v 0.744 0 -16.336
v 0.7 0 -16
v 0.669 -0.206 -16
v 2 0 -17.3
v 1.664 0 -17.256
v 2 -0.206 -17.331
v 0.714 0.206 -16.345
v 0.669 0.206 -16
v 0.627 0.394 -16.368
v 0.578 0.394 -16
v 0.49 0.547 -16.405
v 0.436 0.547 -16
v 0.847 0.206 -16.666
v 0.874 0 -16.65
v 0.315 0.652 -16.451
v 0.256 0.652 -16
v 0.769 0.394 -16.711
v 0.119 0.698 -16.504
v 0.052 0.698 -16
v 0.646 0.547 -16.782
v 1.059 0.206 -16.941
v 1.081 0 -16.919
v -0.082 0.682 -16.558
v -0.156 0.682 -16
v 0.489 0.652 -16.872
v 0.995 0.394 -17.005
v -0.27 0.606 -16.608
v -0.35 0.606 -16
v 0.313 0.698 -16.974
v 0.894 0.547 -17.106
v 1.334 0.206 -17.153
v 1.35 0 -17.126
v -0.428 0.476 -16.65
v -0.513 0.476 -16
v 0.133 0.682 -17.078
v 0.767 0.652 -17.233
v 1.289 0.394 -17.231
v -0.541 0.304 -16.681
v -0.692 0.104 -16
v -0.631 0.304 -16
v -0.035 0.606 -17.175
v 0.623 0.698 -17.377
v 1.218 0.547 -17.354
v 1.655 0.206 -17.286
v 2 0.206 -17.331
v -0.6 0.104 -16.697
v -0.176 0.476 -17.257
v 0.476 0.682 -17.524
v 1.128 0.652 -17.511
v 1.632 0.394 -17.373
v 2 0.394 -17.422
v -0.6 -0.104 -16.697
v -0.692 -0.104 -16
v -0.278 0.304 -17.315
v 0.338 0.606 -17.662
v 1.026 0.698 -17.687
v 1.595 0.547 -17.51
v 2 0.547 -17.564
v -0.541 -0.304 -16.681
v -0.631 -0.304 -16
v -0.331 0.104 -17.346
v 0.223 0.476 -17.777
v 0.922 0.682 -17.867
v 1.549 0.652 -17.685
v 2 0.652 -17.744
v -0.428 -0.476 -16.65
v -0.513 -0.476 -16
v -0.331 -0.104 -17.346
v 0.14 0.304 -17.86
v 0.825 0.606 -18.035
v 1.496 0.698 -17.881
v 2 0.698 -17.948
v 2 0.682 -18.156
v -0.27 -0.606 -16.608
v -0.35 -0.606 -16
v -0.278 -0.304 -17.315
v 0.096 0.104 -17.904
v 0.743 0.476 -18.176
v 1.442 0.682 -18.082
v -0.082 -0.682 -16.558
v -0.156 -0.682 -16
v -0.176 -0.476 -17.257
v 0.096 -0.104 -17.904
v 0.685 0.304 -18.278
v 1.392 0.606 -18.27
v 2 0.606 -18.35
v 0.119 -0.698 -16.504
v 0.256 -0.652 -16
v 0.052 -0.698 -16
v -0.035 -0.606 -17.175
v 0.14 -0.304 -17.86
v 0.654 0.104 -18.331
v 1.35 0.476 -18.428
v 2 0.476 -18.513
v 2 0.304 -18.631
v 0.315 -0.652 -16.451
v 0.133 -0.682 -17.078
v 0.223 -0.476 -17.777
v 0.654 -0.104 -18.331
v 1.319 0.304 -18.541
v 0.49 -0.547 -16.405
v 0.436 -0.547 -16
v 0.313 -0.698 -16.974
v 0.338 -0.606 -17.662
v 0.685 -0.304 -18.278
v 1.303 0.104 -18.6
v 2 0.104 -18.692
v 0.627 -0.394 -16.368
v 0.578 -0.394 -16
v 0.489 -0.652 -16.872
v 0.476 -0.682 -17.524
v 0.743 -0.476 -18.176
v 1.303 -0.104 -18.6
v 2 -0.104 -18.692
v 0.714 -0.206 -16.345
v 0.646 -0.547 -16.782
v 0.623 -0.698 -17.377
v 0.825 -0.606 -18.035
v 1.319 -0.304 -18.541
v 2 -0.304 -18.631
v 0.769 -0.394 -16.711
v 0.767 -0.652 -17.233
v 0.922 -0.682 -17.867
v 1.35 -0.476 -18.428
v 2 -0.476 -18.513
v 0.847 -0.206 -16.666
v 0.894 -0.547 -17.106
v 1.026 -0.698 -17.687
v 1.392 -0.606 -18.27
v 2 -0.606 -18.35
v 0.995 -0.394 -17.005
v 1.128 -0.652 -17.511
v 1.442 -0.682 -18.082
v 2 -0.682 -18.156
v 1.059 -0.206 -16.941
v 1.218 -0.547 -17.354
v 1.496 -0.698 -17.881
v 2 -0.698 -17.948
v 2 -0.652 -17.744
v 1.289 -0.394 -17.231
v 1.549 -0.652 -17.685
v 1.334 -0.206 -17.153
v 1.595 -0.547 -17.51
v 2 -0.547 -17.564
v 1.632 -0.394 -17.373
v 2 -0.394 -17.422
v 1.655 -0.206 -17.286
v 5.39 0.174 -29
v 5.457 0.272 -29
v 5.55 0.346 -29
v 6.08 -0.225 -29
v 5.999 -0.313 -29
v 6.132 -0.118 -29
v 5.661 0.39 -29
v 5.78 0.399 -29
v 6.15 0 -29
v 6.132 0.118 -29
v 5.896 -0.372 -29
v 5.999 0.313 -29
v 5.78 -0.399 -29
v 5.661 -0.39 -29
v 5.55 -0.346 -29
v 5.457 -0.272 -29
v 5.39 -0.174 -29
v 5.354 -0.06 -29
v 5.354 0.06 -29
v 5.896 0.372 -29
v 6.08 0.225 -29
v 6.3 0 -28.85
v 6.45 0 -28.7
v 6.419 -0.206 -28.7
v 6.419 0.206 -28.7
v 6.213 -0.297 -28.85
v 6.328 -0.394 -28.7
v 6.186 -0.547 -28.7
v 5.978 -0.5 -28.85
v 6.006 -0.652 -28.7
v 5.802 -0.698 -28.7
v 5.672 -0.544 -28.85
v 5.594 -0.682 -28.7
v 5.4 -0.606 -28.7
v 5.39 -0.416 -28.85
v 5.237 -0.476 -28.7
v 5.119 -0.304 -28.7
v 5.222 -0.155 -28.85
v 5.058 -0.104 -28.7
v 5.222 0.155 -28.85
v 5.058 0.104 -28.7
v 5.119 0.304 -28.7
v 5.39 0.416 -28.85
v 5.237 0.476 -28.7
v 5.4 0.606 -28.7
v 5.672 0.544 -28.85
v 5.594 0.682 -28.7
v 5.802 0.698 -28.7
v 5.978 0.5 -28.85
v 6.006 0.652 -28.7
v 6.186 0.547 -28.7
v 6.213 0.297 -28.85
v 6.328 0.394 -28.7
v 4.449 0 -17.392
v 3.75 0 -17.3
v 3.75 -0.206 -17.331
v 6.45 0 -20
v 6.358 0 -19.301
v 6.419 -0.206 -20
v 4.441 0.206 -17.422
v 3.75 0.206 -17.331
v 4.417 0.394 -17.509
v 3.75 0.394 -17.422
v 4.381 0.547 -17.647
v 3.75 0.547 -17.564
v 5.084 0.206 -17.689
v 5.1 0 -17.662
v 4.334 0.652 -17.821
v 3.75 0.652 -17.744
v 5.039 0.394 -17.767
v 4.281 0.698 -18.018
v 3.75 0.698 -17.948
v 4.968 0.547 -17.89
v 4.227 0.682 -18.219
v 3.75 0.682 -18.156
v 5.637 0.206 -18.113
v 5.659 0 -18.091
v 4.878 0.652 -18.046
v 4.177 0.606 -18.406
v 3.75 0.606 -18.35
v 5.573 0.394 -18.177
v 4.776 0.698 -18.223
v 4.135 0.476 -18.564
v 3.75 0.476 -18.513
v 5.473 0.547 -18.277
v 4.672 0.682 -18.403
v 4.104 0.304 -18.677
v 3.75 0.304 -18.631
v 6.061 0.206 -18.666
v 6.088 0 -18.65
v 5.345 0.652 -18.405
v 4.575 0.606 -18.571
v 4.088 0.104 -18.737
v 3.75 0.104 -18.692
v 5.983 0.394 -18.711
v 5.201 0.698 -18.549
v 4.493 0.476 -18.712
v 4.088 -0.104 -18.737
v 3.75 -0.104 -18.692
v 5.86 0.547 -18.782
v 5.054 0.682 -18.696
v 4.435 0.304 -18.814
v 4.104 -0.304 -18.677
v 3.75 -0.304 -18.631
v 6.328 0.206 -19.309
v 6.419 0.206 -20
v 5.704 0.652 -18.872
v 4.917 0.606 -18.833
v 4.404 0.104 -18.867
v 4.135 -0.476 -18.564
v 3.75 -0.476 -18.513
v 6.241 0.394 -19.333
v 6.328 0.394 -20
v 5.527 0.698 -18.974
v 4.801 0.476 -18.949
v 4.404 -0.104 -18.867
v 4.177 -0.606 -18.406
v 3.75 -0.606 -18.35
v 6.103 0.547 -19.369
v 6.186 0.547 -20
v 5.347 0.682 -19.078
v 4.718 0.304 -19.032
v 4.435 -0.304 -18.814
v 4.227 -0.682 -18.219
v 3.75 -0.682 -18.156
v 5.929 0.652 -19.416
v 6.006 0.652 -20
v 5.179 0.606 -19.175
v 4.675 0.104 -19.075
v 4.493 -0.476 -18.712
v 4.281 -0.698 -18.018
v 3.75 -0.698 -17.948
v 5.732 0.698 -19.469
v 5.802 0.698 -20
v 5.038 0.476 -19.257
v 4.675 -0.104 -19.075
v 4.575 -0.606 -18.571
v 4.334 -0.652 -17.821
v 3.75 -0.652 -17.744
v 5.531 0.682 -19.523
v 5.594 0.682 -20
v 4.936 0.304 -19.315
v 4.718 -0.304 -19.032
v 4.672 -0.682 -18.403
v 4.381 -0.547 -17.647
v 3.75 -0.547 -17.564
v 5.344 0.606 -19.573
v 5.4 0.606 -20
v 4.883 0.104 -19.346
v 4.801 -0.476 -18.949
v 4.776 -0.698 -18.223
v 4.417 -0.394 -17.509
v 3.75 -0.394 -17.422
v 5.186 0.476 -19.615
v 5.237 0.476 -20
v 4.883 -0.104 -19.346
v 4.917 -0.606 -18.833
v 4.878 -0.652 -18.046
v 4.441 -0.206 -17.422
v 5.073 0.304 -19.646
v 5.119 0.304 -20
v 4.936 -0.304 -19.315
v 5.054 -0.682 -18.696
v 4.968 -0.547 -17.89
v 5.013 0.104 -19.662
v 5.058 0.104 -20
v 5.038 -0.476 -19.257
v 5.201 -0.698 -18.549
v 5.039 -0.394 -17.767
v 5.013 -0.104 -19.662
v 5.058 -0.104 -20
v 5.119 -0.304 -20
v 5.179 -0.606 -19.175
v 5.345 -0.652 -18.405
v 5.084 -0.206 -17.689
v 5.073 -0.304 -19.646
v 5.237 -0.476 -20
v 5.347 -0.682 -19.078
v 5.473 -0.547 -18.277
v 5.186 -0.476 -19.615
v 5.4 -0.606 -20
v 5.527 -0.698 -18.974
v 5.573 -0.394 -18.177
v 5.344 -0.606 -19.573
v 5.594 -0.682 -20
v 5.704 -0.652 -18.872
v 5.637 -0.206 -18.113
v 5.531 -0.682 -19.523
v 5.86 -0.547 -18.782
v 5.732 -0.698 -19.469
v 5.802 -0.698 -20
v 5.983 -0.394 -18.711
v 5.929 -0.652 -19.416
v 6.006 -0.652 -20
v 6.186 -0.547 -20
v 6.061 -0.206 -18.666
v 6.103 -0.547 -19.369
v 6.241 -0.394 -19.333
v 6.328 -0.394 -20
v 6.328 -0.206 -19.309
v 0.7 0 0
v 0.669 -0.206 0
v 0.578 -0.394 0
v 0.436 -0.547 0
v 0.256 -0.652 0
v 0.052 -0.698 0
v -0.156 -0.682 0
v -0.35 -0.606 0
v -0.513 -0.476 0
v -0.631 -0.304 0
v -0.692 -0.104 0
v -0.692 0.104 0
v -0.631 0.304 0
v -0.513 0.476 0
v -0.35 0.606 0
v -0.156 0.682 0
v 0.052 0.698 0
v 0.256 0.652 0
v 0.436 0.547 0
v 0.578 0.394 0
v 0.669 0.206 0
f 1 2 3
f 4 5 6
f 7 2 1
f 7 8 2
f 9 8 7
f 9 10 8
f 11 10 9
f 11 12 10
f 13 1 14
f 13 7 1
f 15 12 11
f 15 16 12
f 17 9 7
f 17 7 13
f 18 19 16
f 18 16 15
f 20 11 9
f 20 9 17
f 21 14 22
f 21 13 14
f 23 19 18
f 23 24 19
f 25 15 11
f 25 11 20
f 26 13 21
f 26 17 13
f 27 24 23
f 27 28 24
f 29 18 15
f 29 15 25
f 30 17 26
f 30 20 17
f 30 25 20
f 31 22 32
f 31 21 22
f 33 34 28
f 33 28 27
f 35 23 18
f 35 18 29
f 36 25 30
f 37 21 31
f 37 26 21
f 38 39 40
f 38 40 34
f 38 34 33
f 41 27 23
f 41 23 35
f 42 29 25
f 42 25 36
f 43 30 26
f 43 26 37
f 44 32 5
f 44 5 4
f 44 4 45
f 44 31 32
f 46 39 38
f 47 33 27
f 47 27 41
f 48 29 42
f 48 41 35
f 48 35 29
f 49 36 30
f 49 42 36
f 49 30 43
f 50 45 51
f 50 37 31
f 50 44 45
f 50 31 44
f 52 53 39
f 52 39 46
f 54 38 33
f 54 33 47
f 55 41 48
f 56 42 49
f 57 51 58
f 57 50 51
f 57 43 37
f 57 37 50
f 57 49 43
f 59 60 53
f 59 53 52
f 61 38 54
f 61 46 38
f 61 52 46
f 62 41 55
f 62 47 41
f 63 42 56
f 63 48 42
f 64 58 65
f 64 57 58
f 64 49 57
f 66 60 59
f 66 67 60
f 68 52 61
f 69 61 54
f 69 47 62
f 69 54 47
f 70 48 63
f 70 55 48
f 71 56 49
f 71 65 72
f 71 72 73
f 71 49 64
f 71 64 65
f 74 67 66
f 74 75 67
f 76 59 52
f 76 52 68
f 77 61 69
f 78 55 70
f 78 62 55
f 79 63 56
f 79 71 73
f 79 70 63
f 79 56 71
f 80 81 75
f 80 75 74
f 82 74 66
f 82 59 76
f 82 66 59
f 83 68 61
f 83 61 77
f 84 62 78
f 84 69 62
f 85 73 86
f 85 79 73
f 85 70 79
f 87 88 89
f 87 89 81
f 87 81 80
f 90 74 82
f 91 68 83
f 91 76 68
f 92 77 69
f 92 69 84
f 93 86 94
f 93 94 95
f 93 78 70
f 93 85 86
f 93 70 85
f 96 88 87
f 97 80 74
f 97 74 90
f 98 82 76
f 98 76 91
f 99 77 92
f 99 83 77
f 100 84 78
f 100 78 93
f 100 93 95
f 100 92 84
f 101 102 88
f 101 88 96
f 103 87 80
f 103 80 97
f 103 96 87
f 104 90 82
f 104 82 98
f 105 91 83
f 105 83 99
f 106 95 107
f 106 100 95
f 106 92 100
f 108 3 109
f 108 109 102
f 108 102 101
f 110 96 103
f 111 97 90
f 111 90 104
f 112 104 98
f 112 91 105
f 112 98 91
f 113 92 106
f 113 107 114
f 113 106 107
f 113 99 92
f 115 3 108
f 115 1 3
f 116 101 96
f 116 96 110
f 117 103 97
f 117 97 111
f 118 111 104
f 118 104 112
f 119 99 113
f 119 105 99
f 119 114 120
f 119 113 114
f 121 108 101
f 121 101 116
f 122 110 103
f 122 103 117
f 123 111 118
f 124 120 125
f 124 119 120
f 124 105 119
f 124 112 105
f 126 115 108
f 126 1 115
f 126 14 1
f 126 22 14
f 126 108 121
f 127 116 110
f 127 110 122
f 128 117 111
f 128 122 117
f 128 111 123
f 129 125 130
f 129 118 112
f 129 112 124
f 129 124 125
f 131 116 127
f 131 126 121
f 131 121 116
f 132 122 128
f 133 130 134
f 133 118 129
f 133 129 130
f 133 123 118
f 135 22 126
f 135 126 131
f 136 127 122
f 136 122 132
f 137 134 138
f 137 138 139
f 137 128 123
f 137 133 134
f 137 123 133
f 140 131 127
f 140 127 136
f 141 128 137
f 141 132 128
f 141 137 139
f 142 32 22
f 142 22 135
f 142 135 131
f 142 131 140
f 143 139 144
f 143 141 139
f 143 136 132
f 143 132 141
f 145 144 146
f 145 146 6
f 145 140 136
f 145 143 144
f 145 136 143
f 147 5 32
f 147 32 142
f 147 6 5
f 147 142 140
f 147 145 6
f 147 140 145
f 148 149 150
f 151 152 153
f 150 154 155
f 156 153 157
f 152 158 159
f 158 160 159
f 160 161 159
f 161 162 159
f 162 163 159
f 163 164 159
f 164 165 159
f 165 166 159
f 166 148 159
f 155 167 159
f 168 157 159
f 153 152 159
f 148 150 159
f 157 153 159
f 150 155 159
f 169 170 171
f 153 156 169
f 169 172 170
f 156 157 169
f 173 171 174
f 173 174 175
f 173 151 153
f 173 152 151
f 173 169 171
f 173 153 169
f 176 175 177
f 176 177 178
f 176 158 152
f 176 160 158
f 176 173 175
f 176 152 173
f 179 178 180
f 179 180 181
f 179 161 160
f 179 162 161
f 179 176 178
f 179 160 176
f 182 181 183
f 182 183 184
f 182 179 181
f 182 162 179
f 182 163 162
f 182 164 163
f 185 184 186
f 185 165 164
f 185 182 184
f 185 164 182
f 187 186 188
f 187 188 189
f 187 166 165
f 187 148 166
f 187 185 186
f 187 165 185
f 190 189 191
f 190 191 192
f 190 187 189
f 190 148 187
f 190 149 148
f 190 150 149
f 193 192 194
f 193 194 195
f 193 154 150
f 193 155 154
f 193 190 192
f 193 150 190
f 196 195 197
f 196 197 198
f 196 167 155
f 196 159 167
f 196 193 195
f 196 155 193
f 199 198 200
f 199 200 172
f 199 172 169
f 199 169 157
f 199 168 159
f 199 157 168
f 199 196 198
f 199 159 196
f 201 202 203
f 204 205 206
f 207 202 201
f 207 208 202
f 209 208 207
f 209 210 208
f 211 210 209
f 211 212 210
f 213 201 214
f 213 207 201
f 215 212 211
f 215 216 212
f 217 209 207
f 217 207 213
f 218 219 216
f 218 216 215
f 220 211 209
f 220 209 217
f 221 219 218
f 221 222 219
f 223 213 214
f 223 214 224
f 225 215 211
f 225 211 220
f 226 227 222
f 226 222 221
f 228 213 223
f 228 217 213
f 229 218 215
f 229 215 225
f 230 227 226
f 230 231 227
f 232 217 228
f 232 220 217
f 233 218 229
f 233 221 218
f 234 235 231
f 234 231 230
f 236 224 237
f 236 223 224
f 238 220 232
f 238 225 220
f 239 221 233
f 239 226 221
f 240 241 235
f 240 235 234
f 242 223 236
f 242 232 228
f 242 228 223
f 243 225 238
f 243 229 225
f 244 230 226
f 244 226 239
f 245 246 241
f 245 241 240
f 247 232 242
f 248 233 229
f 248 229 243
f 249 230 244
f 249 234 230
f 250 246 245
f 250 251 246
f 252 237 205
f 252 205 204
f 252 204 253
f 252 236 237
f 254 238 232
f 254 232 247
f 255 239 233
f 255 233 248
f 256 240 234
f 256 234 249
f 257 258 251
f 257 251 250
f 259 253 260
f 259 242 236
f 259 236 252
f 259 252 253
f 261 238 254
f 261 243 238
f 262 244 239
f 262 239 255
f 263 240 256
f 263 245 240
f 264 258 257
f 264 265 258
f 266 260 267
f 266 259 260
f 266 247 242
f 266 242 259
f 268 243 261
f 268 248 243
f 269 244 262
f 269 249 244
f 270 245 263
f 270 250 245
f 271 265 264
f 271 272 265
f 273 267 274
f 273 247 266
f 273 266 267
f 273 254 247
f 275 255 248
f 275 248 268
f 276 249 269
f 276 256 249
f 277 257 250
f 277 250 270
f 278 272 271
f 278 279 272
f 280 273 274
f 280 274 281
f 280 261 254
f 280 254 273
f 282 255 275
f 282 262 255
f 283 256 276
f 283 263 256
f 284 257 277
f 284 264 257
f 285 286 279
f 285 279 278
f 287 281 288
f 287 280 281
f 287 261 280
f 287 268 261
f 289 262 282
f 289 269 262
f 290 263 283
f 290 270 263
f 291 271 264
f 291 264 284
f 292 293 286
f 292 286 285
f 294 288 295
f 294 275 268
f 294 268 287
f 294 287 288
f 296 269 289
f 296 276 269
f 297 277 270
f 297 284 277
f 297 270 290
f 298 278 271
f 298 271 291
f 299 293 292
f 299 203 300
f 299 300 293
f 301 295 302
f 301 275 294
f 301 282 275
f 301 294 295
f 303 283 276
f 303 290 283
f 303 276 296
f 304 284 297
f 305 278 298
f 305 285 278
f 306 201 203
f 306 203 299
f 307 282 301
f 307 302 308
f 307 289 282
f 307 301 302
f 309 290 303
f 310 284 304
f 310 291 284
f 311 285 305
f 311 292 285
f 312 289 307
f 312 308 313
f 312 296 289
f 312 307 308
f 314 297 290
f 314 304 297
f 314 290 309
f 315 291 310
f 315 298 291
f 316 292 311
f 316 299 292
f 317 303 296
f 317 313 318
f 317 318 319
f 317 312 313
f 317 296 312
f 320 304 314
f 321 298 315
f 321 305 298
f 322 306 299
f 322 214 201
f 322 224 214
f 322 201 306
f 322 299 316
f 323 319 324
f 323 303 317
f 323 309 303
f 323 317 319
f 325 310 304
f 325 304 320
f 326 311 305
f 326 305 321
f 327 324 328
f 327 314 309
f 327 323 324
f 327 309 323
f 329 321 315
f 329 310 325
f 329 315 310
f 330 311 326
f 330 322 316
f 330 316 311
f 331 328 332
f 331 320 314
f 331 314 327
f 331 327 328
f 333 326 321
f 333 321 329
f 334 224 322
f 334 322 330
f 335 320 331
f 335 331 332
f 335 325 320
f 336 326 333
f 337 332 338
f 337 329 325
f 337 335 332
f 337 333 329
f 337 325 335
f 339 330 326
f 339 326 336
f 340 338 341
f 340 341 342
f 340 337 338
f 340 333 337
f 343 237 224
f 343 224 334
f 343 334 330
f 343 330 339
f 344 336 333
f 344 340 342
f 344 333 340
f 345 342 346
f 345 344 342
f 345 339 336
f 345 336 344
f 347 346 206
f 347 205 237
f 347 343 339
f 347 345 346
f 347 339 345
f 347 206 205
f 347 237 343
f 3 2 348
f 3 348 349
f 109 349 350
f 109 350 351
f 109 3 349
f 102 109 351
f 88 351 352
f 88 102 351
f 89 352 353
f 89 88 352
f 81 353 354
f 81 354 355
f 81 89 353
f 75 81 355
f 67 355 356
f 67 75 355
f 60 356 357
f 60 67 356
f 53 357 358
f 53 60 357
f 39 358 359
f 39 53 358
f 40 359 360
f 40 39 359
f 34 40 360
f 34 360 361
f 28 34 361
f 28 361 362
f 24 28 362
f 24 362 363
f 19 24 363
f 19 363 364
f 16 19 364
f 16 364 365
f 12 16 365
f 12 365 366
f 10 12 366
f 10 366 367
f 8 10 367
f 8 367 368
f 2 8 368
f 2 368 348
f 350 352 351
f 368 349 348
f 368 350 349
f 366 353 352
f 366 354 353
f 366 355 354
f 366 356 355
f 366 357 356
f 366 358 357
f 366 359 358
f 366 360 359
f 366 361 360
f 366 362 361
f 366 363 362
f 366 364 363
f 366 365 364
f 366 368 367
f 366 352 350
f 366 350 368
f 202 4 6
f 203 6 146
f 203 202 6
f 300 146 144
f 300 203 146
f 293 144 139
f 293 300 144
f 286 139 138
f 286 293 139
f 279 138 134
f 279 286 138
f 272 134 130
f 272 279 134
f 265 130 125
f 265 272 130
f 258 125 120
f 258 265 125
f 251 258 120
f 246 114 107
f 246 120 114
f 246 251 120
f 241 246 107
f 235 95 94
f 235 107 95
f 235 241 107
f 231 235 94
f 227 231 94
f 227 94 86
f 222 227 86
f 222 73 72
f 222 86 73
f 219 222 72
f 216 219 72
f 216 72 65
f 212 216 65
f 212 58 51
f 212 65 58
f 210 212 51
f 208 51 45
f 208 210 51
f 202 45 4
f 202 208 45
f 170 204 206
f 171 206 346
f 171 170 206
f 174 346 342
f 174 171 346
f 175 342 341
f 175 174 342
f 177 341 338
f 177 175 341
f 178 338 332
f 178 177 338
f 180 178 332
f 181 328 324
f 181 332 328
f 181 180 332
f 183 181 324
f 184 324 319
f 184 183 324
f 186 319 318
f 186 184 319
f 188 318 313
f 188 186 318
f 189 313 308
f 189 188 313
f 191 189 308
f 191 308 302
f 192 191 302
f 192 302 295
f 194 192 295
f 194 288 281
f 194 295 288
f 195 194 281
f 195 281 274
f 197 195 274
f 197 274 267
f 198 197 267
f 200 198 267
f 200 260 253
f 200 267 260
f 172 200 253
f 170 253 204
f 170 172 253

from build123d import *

# Parameters (mm, degrees)
SKETCH2_R     = 0.7
CHAMFER1_SIZE = 0.3


with BuildPart() as part:
    # Sweep1: sweep along a path in Sketch1
    with BuildLine(Plane(origin=(0, 0, 0), x_dir=(1, 0, 0), z_dir=(0, 1, 0))) as sweep1_path:
        Line((0, 0), (0, 16))
        ThreePointArc((0, 16), (0.585786438, 17.414213562), (2, 18))
        Line((2, 18), (3.75, 18))
        ThreePointArc((3.75, 18), (5.164213562, 18.585786438), (5.75, 20))
        Line((5.75, 20), (5.75, 29))
    # Sketch2 → Sweep1 (sweep)
    with BuildSketch(Plane.XY):
        Circle(SKETCH2_R)
    sweep(path=sweep1_path.line)

    # Chamfer1
    chamfer1_edges = [part.edges().sort_by_distance(p)[0] for p in [
        (5.05, 0, -29),
    ]]
    chamfer(chamfer1_edges, length=CHAMFER1_SIZE)


solid = part.part
